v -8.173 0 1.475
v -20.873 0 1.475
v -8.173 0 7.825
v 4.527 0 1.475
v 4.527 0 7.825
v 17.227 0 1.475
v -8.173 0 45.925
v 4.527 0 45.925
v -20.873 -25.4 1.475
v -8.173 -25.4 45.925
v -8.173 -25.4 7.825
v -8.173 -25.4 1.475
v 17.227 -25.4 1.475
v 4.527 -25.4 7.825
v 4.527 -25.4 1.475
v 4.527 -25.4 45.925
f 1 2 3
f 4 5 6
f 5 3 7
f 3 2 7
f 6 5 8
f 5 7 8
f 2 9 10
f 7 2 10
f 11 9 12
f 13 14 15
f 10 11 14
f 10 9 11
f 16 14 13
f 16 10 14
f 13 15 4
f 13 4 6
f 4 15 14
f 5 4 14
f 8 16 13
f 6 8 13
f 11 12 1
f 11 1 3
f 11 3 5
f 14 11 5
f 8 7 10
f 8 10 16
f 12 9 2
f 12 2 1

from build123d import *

# Parameters (mm, degrees)
F0_W     = 38.1
F0_H     = 44.45
F1_DEPTH = 25.4
F3_DEPTH = 25.401
F5_DEPTH = 25.401
F6_W     = 12.7
F6_H     = 6.35
F7_DEPTH = 25.401


with BuildPart() as f1:
    # F0 (on Front) → F1 (new body)
    with BuildSketch(Plane.XZ):
        with Locations((-1.822717, 23.700186)):
            Rectangle(F0_W, F0_H)
    extrude(amount=F1_DEPTH)

    # F2 (on face) → F3 (cut, through all)
    with BuildSketch(Plane.XZ.offset(25.4)):
        Polygon((17.227283, 45.925186), (4.527283, 45.925186), (17.227283, 1.475186), align=None)
    extrude(amount=-F3_DEPTH, mode=Mode.SUBTRACT)

    # F4 (on face) → F5 (cut, through all)
    with BuildSketch(Plane.XZ.offset(25.4)):
        Polygon((-20.872717, 1.475186), (-8.172717, 45.925186), (-20.872717, 45.925186), align=None)
    extrude(amount=-F5_DEPTH, mode=Mode.SUBTRACT)

    # F6 (on face) → F7 (cut, through all)
    with BuildSketch(Plane.XZ.offset(25.4)):
        with Locations((-1.822717, 4.650186)):
            Rectangle(F6_W, F6_H)
    extrude(amount=-F7_DEPTH, mode=Mode.SUBTRACT)


solid = f1.part
